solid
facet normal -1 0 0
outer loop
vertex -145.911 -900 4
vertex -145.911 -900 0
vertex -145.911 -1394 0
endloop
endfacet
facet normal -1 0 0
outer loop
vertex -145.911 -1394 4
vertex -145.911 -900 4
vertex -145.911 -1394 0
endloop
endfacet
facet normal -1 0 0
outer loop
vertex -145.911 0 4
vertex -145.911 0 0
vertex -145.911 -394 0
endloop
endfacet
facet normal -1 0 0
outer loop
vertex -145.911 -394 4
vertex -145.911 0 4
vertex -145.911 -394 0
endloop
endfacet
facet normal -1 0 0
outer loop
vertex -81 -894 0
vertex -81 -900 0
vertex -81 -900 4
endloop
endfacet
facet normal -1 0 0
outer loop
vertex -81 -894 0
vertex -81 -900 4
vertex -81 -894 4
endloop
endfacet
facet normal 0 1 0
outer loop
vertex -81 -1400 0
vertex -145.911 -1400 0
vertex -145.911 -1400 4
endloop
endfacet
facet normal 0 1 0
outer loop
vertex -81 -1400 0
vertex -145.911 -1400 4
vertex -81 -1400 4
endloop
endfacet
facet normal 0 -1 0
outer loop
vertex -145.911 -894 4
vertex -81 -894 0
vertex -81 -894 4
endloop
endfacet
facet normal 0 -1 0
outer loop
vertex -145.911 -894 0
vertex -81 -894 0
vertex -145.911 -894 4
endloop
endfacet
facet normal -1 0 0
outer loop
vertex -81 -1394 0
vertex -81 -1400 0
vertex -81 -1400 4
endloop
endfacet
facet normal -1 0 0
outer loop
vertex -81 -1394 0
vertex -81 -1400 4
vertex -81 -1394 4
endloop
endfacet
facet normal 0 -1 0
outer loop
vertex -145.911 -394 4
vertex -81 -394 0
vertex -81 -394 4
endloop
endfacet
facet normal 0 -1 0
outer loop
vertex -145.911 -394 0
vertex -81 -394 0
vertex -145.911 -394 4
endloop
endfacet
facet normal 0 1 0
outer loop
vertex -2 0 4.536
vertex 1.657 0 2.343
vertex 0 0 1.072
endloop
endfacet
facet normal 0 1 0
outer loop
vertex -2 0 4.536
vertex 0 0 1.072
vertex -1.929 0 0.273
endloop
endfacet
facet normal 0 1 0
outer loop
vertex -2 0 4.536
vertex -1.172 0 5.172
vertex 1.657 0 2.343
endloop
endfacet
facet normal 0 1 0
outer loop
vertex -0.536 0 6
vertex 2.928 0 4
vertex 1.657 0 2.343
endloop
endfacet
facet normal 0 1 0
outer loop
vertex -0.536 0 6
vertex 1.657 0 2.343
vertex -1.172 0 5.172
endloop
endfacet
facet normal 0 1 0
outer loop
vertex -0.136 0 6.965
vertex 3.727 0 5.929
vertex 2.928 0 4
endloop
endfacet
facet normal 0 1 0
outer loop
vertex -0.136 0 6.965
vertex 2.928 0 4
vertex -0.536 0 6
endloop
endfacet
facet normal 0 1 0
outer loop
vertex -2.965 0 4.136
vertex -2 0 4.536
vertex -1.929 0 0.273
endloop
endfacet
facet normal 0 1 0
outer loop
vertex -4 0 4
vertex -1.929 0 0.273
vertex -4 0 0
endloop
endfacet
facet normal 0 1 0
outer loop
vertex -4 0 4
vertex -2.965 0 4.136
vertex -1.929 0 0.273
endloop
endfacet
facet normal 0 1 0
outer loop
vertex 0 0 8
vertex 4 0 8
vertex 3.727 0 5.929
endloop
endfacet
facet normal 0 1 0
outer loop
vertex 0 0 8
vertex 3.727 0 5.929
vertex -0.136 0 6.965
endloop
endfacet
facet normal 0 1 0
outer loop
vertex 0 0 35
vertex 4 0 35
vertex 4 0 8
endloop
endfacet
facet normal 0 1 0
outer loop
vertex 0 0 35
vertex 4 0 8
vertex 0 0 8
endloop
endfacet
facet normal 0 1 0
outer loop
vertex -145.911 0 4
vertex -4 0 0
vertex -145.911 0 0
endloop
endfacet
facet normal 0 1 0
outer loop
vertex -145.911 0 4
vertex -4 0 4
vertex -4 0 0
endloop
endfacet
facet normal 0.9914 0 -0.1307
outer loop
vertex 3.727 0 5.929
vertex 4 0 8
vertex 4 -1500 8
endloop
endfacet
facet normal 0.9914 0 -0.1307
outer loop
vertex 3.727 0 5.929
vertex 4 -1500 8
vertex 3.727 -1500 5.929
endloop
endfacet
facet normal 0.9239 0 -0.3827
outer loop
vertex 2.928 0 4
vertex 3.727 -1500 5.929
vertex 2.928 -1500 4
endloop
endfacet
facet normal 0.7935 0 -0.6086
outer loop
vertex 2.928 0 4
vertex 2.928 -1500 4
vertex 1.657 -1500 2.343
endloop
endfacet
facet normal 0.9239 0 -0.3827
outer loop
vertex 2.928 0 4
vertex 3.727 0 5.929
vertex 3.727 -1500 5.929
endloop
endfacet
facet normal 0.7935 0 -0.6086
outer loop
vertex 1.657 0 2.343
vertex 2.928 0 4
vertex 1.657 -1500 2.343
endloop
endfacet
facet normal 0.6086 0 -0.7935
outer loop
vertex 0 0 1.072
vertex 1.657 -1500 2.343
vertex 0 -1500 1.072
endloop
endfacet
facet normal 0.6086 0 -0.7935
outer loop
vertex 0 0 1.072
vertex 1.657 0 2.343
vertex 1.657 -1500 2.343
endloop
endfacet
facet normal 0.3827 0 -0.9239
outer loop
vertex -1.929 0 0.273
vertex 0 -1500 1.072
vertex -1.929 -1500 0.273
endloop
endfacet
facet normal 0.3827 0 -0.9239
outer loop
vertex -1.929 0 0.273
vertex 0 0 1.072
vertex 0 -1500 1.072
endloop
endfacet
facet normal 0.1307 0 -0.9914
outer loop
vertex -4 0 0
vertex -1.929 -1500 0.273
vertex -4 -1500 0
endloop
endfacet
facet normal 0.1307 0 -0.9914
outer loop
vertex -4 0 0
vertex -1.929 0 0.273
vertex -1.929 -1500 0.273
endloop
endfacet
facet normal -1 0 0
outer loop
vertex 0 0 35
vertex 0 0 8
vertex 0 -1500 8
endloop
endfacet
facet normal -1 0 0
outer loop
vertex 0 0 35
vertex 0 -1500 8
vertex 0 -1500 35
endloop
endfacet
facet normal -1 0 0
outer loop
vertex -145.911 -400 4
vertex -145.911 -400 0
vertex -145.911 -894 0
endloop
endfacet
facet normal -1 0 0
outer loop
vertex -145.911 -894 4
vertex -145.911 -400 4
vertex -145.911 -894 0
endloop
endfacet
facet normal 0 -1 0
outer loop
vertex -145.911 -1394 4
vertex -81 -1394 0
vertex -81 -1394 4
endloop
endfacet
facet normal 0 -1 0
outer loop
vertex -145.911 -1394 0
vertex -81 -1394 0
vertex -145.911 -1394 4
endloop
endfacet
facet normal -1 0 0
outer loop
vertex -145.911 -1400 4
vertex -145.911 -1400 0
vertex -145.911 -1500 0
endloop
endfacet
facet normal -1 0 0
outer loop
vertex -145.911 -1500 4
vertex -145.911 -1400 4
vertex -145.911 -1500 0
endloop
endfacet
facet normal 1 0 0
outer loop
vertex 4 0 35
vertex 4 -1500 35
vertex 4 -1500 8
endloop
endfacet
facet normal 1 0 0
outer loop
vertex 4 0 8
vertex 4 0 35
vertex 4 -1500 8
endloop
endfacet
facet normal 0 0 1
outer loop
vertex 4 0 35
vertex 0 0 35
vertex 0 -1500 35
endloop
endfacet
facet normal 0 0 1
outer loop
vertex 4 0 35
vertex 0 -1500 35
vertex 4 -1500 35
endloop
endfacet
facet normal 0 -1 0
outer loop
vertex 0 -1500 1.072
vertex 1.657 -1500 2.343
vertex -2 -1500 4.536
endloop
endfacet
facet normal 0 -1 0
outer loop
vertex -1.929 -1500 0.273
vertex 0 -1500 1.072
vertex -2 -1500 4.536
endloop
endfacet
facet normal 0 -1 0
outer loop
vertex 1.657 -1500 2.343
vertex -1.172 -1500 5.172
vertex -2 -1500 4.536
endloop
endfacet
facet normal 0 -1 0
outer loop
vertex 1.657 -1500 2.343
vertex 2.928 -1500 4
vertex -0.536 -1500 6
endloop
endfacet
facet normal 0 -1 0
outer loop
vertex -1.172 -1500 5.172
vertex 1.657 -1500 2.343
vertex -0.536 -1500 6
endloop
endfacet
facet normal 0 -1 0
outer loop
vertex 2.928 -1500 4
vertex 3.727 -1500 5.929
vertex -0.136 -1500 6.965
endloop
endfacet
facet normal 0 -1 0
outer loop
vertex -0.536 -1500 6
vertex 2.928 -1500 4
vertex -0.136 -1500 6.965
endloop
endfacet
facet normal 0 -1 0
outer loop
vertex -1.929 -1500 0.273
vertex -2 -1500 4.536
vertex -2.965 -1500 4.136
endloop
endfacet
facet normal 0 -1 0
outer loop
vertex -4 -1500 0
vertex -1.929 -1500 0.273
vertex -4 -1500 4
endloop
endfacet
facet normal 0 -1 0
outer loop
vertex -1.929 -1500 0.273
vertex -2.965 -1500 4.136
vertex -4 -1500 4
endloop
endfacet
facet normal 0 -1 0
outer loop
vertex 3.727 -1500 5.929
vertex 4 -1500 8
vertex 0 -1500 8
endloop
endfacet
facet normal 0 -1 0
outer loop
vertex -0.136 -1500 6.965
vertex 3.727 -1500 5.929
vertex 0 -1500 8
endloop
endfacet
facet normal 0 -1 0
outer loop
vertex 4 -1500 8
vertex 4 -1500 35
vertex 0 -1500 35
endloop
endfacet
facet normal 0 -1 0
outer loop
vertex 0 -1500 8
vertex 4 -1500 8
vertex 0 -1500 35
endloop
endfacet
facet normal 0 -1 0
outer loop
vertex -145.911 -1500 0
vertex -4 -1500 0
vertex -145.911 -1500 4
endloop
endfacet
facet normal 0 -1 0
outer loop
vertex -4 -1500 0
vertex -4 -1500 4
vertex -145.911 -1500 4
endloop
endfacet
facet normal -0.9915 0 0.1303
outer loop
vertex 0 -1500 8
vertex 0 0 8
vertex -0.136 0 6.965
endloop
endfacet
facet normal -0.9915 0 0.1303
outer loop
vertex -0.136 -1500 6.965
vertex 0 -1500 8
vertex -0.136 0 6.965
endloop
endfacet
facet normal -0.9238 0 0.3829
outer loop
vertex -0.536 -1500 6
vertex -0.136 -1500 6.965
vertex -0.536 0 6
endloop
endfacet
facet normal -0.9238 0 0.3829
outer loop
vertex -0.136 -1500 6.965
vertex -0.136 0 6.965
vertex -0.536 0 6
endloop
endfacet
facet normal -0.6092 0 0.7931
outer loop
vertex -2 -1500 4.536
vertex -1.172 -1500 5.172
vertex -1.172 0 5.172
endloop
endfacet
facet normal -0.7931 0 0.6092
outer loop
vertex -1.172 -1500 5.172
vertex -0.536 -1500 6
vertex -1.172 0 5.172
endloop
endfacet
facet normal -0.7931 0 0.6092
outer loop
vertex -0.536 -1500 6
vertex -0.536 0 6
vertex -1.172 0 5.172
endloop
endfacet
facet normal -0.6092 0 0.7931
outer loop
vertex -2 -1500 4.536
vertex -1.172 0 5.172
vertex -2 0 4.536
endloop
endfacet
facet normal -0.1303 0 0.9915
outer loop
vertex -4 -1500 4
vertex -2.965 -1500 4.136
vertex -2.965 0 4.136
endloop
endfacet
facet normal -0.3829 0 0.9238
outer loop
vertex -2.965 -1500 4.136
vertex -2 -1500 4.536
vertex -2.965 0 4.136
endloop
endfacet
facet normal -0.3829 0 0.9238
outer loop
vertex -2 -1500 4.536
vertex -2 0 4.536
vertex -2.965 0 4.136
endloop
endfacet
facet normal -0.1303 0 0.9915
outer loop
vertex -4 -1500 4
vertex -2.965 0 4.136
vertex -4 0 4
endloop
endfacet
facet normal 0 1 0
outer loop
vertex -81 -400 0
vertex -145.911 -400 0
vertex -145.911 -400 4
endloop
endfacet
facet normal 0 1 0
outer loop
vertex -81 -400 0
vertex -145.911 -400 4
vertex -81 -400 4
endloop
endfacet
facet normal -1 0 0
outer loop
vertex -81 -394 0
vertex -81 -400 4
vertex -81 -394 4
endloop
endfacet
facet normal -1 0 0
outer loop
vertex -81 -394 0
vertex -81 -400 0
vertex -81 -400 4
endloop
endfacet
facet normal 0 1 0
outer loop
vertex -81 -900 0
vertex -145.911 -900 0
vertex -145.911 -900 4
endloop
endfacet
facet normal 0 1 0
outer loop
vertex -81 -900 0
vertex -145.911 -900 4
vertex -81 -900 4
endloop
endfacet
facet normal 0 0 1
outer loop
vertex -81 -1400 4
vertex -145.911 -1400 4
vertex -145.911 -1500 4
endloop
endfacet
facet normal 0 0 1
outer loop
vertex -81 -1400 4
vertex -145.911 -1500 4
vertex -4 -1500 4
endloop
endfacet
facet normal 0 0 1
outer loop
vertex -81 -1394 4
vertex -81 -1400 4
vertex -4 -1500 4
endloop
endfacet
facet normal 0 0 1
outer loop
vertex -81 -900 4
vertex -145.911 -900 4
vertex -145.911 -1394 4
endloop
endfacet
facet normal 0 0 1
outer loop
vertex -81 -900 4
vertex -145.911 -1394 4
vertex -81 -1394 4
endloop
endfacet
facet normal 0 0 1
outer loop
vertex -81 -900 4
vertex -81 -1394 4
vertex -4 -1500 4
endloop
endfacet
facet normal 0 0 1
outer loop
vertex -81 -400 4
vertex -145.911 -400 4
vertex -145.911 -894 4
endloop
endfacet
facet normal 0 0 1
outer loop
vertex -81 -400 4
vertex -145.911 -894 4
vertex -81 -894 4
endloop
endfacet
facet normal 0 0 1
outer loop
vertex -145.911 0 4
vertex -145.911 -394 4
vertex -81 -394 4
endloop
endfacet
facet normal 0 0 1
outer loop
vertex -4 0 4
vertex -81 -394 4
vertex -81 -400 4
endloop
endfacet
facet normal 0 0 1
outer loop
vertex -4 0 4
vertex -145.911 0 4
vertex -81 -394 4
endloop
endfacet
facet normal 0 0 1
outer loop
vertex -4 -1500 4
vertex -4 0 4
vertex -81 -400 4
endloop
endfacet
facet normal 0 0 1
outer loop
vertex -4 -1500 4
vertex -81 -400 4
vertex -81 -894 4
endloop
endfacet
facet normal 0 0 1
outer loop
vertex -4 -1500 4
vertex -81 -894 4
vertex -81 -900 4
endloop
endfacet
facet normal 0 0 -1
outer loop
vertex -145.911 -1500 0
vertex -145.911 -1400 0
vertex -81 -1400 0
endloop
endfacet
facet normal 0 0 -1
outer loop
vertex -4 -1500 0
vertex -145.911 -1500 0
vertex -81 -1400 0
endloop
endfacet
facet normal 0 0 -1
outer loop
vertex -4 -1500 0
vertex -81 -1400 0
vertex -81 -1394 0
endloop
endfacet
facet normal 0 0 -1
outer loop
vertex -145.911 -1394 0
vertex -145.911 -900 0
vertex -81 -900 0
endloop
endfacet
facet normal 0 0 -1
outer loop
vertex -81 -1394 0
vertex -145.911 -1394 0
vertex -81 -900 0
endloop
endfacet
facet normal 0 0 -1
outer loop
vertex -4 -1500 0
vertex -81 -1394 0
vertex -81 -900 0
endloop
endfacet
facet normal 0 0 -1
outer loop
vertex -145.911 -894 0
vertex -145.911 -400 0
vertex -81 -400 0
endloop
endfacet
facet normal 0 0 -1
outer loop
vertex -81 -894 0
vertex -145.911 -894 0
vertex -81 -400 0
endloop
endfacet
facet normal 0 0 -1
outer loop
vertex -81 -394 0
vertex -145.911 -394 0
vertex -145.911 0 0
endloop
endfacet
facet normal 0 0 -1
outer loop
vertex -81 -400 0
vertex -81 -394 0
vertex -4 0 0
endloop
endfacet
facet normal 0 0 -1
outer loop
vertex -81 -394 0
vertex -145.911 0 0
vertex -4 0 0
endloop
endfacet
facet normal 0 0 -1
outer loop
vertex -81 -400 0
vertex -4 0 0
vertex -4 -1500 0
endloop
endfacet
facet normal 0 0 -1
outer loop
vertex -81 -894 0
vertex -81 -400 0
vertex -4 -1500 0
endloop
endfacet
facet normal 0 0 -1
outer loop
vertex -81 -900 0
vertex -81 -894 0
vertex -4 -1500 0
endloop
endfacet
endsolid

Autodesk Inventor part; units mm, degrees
ref_plane "YZ Plane" through (0, 0, 0) normal (1, 0, 0) x (0, 1, 0)
ref_plane "XZ Plane" through (0, 0, 0) normal (0, 1, 0) x (-1, 0, 0)
ref_plane "XY Plane" through (0, 0, 0) normal (0, 0, 1) x (1, 0, 0)
sketch "Sketch1" plane through (0, 0, 0) normal (0, 0, 1) x (1, 0, 0)
  line L0 (0, 0) -> (-145.9112, 0)
  line L1 (-145.9112, 0) -> (-145.9112, -1500)
  line L2 (-145.9112, -1500) -> (0, -1500)
  line L3 (0, -1500) -> (0, 0)
  line L4 (-145.9112, -1400) -> (-81, -1400)
  line L5 (-81, -1400) -> (-81, -1394)
  line L6 (-81, -1394) -> (-145.9112, -1394)
  line L7 (-145.9112, -1394) -> (-145.9112, -1400)
  line L8 (-145.9112, -900) -> (-81, -900)
  line L9 (-81, -900) -> (-81, -894)
  line L10 (-81, -894) -> (-145.9112, -894)
  line L11 (-145.9112, -894) -> (-145.9112, -900)
  line L12 (-145.9112, -400) -> (-81, -400)
  line L13 (-81, -400) -> (-81, -394)
  line L14 (-81, -394) -> (-145.9112, -394)
  line L15 (-145.9112, -394) -> (-145.9112, -400)
  point P0 (-145.9112, -394)
  point P1 (-145.9112, -400)
  point P2 (-145.9112, -894)
  point P3 (-145.9112, -900)
  point P4 (-145.9112, -1394)
  dimension "d0" = 1500
  dimension "d1" = 145.9112
  dimension "d2" = 6
  dimension "d4" = 100
  dimension "d7" = 500
  dimension "d23" = 81
extrude "Plate1" add sketch "Sketch1" along normal blind 4 contours L3 L2 L1 L4 L5 L6 L8 L9 L10 L12 L13 L14 L0
sketch "Sketch2" plane through (4, 0, 0) normal (-1, 0, 0) x (0, -1, 0)
  line L0 (1500, 0) -> (0, 0)
  line L1 (0, 0) -> (0, 35)
  line L2 (0, 35) -> (1500, 35)
  line L3 (1500, 35) -> (1500, 0)
edge flange "Flange1" height 35 angle 90 thickness 4 bend radius 4 thickness toward (-1, 0, 0) relief tear relief width 4 relief depth 2 edges at (0, -750, 4) wall of the first edge with corners at (4, -1500, 0) (4, 0, 0) (4, 0, 35) (4, -1500, 35)
bend "Bend1"
corner "Corner1"
equation "\"d1\" = Stringer2_3_deep"
equation "\"d12\" = Thickness"
equation "\"d13\" = BendReliefWidth"
equation "\"d14\" = BendReliefDepth"
equation "\"d15\" = MinimumRemnant"
equation "\"d16\" = TransitionRadius"
equation "\"d19\" = BendRadius"
equation "\"d20\" = CornerReliefSize"
equation "\"d21\" = GapSize"
equation "\"d22\" = JacobiRadiusSize"
equation "\"BendRadius\" = Thickness"
equation "\"BendReliefWidth\" = Thickness"
equation "\"BendReliefDepth\" = 0.5 * Thickness"
equation "\"CornerReliefSize\" = 4 * Thickness"
equation "\"MinimumRemnant\" = 2 * Thickness"
equation "\"TransitionRadius\" = BendRadius"
equation "\"JacobiRadiusSize\" = BendRadius"
equation "\"GapSize\" = Thickness"
equation "\"Stringer2_3_deep\" = 145.911249"
equation "\"Thickness\" = 4"
properties part number "stringer 1.3_CPY2"
